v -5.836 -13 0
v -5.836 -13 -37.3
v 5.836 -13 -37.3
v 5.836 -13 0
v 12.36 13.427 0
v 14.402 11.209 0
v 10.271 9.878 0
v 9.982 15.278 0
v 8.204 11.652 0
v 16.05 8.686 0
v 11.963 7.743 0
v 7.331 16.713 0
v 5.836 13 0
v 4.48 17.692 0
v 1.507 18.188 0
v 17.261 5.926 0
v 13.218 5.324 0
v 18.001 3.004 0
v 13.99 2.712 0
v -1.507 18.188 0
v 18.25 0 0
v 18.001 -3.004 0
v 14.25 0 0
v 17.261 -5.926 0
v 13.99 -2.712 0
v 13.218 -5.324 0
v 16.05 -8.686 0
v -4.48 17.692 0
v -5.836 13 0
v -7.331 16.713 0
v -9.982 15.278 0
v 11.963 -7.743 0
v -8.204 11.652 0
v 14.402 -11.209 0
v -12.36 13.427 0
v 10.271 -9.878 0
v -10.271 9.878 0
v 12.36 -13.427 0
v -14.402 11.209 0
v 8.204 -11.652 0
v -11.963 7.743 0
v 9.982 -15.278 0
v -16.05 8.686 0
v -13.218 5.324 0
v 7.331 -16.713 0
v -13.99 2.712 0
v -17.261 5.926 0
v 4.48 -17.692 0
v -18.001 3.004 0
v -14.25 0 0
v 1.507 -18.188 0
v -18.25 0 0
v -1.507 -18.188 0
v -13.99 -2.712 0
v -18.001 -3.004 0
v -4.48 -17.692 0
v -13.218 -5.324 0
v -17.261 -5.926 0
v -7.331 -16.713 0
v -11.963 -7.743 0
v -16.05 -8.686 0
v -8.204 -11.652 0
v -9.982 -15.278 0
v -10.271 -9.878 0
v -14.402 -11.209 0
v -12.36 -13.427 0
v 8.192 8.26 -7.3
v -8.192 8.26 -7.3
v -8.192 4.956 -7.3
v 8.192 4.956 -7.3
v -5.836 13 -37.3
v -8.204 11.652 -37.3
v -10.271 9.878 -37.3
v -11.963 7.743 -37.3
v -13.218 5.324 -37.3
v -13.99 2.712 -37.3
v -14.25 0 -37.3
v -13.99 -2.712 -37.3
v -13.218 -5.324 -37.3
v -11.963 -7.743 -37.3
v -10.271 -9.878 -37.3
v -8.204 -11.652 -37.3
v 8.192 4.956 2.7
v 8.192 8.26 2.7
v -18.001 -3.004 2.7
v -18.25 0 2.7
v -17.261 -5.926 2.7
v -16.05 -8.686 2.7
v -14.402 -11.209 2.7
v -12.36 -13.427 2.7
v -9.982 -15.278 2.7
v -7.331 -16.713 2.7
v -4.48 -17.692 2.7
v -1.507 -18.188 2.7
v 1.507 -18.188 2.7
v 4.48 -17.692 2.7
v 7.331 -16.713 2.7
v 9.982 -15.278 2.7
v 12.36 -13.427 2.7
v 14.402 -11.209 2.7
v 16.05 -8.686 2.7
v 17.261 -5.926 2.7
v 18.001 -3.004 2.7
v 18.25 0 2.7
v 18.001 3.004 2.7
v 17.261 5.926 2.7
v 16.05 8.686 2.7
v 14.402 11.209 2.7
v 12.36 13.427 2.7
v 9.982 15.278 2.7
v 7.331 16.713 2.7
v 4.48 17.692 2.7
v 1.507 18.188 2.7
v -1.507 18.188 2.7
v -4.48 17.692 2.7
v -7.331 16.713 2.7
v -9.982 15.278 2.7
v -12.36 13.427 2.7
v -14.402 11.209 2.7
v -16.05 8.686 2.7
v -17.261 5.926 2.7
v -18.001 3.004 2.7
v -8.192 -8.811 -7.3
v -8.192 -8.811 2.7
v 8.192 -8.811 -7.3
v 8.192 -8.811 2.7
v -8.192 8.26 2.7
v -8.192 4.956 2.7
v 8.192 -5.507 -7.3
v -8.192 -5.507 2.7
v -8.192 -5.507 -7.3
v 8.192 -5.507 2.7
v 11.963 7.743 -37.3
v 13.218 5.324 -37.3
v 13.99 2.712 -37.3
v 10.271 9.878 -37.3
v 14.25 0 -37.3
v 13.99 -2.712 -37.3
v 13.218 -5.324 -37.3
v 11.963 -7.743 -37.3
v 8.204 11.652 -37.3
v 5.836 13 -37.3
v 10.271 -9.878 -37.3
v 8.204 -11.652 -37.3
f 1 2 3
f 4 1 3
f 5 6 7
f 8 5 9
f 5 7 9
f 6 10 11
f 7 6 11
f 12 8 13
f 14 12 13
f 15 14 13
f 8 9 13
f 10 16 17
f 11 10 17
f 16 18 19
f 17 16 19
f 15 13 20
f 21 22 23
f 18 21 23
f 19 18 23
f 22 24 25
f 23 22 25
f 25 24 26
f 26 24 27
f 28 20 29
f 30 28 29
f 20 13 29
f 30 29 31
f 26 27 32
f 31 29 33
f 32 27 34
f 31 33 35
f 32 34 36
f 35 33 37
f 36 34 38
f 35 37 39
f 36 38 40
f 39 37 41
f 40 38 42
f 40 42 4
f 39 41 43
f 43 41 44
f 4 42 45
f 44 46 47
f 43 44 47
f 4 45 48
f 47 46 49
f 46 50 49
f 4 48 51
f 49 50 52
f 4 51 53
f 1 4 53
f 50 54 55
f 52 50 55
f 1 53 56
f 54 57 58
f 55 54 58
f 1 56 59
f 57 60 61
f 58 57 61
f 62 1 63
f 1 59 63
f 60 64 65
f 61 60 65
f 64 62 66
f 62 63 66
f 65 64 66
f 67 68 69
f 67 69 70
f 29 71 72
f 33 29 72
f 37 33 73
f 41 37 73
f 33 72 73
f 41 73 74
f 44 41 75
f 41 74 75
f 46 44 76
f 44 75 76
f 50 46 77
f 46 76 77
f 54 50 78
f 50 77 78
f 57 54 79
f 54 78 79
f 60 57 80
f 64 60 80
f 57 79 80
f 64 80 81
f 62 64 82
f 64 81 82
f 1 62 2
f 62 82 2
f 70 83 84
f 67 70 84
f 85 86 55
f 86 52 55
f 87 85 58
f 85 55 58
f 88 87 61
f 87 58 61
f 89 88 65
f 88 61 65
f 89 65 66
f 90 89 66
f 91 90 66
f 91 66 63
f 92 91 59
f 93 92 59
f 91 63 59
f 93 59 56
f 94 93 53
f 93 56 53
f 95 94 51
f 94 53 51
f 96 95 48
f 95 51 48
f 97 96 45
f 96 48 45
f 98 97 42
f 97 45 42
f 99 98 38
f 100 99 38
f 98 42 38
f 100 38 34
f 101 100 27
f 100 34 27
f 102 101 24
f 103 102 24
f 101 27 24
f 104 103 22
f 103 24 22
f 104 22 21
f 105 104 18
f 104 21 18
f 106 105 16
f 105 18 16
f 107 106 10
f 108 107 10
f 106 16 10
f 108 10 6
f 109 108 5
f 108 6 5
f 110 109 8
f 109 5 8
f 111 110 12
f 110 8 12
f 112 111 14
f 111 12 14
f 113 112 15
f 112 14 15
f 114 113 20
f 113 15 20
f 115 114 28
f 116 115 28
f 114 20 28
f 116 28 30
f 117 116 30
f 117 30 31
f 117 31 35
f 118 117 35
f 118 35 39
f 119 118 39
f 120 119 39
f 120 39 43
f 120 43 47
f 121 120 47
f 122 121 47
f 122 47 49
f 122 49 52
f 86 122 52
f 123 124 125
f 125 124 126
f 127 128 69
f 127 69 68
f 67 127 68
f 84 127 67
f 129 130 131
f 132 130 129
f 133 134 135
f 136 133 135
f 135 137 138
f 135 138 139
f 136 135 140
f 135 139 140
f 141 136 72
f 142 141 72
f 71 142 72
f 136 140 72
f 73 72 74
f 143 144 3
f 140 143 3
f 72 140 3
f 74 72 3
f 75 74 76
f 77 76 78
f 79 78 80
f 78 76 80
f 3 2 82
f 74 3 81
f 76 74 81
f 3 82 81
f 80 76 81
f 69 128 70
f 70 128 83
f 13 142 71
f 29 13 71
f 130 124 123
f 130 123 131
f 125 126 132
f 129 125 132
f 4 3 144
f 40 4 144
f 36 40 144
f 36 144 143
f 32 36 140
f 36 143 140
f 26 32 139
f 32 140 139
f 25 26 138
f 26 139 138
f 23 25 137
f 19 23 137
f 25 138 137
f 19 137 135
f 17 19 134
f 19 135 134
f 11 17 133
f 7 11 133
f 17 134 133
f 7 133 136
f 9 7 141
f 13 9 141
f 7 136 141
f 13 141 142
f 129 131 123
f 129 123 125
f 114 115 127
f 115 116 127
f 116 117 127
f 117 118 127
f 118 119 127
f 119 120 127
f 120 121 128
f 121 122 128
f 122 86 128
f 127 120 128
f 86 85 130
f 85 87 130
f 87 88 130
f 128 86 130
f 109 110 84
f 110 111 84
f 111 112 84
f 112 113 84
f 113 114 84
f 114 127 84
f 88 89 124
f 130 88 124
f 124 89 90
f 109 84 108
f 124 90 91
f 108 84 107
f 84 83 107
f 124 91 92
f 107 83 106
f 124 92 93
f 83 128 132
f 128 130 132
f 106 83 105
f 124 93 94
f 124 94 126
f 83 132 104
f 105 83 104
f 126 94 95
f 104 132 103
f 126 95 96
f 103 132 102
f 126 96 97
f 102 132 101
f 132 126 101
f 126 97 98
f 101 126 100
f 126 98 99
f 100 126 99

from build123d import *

# Parameters (mm, degrees)
F2_W     = 16.383304
F2_H     = 3.304196
F3_DEPTH = 10
F5_DEPTH = 37.3


with BuildPart() as f1:
    # F0 (on Front) → F1 (revolve)
    with BuildSketch(Plane.XZ):
        Polygon((0, -37.3), (0, 2.7), (-18.25, 2.7), (-18.25, 0), (-14.25, 0), (-14.25, -37.3), align=None)
    revolve(axis=Axis((0, 0, -17.3), (0, 0, 1)))

    # F2 (on face) → F3 (cut)
    with BuildSketch(Plane.XY.offset(2.7)):
        with Locations((0, 6.608392)):
            Rectangle(F2_W, F2_H)
        with Locations((0, -7.159091)):
            Rectangle(F2_W, F2_H)
    extrude(amount=-F3_DEPTH, mode=Mode.SUBTRACT)

    # F4 (on face) → F5 (cut, through all)
    with BuildSketch(Plane(origin=(0, 0, -37.3), x_dir=(1, 0, 0), z_dir=(0, 0, -1))):
        with BuildLine():
            ThreePointArc((5.836309, 13), (0, 14.25), (-5.836309, 13))
            Line((-5.836309, 13), (5.836309, 13))
        make_face()
        with BuildLine():
            Line((5.836309, -13), (-5.836309, -13))
            ThreePointArc((-5.836309, -13), (0, -14.25), (5.836309, -13))
        make_face()
    extrude(amount=-F5_DEPTH, mode=Mode.SUBTRACT)


solid = f1.part
